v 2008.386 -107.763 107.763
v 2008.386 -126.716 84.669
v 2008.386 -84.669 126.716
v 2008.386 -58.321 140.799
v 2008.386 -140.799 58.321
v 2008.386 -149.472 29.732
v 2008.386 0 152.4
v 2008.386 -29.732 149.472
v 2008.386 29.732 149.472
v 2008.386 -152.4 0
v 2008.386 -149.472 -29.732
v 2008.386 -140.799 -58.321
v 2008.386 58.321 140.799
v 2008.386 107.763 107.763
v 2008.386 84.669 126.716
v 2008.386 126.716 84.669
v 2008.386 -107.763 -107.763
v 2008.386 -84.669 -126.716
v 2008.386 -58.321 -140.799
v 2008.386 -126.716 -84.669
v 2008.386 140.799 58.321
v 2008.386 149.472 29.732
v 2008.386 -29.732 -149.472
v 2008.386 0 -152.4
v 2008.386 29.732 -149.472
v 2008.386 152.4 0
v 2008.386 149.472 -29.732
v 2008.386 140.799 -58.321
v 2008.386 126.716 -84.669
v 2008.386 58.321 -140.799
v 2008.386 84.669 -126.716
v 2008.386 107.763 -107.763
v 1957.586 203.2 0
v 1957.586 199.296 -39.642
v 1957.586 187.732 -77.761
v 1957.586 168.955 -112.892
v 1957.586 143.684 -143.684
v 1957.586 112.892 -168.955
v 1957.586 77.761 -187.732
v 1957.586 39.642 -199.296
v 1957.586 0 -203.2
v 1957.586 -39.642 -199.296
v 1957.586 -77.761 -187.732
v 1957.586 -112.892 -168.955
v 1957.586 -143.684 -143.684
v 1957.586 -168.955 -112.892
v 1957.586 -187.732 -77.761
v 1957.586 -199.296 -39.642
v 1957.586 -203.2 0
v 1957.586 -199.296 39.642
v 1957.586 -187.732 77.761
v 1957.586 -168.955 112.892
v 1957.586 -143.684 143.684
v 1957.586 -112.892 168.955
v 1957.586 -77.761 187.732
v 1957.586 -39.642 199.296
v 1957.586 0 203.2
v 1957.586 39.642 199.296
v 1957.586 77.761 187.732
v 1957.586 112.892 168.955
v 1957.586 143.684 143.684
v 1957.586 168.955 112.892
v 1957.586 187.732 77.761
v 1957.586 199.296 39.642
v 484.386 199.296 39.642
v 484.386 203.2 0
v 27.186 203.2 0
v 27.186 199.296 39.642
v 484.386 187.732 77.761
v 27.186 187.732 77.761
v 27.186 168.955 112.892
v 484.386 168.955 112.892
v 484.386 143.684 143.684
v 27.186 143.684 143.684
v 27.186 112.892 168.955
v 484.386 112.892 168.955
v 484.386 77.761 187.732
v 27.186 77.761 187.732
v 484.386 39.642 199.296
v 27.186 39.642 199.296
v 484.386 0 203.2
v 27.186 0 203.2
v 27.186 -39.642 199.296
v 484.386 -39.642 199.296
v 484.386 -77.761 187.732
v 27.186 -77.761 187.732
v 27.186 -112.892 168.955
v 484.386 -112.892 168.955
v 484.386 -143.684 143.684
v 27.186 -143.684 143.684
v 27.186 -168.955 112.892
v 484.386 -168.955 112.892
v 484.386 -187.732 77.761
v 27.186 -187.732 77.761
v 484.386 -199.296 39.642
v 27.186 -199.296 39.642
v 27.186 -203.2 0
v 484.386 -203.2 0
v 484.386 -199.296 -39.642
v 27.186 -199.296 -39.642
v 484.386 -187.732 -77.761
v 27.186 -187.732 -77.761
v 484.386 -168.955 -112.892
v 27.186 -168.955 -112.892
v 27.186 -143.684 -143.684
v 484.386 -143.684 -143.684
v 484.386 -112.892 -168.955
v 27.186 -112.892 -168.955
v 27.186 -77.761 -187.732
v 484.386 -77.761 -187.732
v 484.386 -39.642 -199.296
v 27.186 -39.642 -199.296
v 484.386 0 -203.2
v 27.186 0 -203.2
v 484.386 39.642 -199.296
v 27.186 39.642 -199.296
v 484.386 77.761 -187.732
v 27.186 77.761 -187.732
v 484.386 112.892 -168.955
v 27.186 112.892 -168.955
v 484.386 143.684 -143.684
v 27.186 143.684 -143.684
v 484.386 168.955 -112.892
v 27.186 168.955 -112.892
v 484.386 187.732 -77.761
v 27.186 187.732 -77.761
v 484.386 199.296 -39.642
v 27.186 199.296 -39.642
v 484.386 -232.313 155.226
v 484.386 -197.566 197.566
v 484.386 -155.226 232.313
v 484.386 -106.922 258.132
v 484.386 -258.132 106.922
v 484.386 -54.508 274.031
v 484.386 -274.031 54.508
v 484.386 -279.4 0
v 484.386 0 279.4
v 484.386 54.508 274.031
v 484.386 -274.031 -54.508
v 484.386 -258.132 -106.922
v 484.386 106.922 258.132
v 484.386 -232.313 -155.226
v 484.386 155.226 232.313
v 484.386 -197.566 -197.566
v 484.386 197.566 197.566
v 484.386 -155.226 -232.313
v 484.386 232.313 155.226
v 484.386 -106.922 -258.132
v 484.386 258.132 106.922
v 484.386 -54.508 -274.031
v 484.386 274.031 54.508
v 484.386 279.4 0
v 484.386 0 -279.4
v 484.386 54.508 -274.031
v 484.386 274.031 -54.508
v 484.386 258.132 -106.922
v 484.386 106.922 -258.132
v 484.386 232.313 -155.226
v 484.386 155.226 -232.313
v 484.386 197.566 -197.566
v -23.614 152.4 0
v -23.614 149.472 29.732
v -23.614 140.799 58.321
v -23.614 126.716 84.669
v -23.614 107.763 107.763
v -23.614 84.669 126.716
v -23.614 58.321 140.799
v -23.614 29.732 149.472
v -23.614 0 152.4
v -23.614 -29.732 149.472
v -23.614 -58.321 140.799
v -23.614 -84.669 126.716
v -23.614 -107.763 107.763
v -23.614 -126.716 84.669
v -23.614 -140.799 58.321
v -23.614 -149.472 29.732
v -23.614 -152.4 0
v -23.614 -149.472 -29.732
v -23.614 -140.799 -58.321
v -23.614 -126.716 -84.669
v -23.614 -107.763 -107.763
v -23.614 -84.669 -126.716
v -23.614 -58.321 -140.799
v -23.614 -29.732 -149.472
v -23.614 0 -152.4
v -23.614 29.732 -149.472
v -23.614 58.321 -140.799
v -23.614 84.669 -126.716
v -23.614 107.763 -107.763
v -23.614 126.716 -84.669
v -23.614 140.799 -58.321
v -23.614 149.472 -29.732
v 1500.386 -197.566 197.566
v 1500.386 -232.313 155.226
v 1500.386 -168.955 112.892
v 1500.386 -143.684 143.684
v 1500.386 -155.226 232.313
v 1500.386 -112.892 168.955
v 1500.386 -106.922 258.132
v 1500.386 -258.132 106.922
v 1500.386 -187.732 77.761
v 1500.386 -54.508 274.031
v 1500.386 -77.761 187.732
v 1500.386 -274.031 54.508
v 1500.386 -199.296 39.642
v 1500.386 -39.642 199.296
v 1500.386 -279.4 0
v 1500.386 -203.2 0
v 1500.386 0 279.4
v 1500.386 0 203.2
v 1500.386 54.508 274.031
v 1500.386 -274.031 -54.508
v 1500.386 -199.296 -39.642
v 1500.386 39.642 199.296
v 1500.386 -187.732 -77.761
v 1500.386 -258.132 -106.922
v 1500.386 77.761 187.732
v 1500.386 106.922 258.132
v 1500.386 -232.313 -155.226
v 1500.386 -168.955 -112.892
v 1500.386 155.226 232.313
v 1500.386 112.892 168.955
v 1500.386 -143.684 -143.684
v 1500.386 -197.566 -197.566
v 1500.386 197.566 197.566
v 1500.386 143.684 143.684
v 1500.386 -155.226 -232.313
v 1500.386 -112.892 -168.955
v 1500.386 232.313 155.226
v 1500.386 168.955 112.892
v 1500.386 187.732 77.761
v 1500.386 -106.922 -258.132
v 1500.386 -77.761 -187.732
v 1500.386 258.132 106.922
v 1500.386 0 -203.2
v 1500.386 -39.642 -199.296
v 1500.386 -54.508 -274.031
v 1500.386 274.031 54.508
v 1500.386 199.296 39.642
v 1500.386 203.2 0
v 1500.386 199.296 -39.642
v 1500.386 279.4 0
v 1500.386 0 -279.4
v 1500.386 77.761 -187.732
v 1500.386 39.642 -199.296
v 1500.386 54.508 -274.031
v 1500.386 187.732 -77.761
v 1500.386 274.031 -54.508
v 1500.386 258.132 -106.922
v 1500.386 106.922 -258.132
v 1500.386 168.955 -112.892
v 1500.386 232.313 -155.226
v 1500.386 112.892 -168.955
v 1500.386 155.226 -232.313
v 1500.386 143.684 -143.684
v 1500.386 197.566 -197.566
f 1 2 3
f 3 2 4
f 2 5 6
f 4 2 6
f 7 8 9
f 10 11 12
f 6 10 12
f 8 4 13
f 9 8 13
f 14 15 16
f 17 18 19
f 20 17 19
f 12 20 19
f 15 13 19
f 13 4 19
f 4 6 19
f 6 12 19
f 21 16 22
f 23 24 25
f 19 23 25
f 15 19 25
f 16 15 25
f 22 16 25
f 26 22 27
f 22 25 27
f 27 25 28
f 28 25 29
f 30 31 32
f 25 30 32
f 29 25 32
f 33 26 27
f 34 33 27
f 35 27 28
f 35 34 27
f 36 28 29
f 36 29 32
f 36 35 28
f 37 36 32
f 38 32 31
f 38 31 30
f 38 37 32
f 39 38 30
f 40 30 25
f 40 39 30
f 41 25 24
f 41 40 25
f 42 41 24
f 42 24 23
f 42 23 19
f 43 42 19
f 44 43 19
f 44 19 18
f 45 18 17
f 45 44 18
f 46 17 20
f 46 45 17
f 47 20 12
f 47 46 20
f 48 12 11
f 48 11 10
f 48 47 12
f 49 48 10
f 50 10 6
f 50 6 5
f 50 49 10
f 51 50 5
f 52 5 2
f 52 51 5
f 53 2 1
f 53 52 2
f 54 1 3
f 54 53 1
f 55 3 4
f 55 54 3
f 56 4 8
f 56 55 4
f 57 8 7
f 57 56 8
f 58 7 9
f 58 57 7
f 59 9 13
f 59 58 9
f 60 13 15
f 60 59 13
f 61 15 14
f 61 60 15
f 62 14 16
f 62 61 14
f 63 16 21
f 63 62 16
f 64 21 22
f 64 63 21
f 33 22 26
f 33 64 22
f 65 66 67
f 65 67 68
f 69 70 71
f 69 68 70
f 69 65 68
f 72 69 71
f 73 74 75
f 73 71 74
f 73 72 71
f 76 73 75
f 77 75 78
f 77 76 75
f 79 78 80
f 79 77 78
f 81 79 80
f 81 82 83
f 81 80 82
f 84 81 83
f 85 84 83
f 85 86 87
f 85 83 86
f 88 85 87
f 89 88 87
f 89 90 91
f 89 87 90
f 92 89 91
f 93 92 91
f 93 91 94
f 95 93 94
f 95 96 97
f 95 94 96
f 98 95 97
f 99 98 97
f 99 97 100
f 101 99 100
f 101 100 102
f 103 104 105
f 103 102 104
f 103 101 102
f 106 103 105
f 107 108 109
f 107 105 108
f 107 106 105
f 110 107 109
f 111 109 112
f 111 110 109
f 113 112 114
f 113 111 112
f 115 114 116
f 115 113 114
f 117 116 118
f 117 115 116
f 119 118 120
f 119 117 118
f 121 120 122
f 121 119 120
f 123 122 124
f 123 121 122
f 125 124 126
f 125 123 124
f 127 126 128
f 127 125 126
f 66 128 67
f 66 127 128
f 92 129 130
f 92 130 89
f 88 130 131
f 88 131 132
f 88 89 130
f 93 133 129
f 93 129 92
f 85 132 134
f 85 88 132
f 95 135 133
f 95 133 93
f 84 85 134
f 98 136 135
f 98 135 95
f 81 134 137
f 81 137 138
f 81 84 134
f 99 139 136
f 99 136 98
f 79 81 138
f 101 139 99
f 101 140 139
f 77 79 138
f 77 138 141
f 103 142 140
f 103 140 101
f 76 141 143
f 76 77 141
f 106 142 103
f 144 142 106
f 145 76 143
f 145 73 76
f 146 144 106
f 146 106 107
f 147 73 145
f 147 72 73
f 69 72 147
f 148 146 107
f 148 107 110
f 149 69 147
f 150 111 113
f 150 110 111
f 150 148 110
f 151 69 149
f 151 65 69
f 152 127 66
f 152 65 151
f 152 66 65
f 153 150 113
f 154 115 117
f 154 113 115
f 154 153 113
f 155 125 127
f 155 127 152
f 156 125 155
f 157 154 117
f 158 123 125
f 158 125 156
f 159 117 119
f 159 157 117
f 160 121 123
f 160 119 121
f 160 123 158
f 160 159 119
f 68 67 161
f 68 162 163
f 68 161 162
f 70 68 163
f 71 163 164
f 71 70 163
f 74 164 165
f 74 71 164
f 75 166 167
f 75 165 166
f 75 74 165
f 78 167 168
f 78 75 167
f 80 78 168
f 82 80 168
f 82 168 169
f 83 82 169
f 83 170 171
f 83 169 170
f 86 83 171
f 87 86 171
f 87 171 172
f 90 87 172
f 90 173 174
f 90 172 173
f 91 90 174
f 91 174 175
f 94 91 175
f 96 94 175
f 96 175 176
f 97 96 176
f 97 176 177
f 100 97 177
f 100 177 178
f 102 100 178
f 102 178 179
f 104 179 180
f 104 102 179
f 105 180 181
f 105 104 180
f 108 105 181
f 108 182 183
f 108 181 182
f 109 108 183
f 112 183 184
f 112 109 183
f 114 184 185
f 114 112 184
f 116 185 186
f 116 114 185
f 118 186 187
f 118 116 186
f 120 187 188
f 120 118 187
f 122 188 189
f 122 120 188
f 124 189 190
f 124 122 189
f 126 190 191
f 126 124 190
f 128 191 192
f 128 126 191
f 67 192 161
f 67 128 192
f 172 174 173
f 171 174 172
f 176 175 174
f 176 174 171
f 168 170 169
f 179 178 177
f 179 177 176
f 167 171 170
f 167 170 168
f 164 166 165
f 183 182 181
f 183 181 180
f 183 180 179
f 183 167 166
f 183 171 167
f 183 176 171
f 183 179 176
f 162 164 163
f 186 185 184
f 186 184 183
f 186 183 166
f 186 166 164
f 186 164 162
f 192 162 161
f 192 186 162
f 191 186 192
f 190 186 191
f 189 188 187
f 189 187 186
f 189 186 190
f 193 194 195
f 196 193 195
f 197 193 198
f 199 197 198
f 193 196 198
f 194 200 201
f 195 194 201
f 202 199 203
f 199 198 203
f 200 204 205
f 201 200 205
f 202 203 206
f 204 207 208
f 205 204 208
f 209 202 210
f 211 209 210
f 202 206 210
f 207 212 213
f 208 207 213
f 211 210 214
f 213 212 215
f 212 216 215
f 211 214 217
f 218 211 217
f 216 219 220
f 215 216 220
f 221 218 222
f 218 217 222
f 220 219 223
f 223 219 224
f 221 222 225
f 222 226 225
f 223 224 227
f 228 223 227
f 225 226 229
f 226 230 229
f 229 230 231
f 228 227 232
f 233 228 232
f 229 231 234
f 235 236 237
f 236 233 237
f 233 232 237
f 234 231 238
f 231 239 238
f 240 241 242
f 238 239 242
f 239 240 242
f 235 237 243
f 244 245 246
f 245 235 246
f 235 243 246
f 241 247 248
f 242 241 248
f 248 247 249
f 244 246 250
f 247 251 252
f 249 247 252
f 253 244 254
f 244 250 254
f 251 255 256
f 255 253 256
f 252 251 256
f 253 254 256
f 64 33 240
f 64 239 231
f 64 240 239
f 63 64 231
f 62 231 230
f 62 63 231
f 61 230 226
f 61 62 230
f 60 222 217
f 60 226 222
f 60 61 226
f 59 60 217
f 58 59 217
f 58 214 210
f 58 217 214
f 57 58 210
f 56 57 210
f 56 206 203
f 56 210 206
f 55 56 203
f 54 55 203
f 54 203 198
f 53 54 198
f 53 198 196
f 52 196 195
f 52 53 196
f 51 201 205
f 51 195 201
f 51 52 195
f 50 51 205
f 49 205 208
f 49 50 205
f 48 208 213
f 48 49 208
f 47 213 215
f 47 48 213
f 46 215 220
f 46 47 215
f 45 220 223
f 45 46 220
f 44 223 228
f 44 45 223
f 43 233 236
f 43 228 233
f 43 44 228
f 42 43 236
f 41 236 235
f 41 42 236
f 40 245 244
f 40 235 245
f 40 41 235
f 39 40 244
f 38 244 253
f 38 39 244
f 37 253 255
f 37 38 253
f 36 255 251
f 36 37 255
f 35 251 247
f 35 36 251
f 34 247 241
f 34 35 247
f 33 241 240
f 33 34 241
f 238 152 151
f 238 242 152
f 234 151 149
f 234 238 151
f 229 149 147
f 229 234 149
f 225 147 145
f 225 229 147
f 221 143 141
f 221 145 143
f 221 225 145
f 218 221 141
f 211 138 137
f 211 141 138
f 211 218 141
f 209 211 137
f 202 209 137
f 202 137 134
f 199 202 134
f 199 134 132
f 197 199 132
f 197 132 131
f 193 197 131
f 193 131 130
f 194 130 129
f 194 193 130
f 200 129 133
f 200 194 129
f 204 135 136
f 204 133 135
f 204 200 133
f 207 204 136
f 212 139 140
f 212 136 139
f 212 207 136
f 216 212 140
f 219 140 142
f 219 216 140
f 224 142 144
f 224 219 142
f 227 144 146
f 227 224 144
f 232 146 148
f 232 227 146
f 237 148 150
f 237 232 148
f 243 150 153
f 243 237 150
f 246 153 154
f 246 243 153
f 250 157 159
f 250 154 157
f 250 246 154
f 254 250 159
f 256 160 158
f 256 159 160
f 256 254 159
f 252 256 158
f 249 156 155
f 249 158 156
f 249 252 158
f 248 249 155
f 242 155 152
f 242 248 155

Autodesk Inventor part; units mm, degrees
ref_plane "YZ Plane" through (0, 0, 0) normal (1, 0, 0) x (0, 1, 0)
ref_plane "XZ Plane" through (0, 0, 0) normal (0, 1, 0) x (-1, 0, 0)
ref_plane "XY Plane" through (0, 0, 0) normal (0, 0, 1) x (1, 0, 0)
sketch "Sketch1" plane through (0, 0, 0) normal (0, 0, 1) x (1, 0, 0)
  line L0 (-23.6137, 0) -> (-23.6137, 203.2)
  line L1 (-23.6137, 203.2) -> (484.3863, 203.2)
  line L2 (484.3863, 203.2) -> (484.3863, 279.4)
  line L3 (484.3863, 279.4) -> (1500.3863, 279.4)
  line L4 (1500.3863, 279.4) -> (1500.3863, 203.2)
  line L5 (1500.3863, 203.2) -> (2008.3863, 203.2)
  line L6 (2008.3863, 203.2) -> (2008.3863, 0)
  line L7 (2008.3863, 0) -> (-23.6137, 0)
  point P0 (0, 0)
  dimension "d0" = 203.2
  dimension "d1" = 508
  dimension "d2" = 76.2
  dimension "d3" = 1016
  dimension "d4" = 76.2
  dimension "d5" = 508
revolve "Revolution1" add sketch "Sketch1" angle 360 about axis through (2008.3863, 0, 0) along (-1, 0, 0)
chamfer "Chamfer1" distance 50.8 angle 45 2 edges at (-23.6137, -203.2, 0) (2008.3863, -203.2, 0)
properties part number "axle"
